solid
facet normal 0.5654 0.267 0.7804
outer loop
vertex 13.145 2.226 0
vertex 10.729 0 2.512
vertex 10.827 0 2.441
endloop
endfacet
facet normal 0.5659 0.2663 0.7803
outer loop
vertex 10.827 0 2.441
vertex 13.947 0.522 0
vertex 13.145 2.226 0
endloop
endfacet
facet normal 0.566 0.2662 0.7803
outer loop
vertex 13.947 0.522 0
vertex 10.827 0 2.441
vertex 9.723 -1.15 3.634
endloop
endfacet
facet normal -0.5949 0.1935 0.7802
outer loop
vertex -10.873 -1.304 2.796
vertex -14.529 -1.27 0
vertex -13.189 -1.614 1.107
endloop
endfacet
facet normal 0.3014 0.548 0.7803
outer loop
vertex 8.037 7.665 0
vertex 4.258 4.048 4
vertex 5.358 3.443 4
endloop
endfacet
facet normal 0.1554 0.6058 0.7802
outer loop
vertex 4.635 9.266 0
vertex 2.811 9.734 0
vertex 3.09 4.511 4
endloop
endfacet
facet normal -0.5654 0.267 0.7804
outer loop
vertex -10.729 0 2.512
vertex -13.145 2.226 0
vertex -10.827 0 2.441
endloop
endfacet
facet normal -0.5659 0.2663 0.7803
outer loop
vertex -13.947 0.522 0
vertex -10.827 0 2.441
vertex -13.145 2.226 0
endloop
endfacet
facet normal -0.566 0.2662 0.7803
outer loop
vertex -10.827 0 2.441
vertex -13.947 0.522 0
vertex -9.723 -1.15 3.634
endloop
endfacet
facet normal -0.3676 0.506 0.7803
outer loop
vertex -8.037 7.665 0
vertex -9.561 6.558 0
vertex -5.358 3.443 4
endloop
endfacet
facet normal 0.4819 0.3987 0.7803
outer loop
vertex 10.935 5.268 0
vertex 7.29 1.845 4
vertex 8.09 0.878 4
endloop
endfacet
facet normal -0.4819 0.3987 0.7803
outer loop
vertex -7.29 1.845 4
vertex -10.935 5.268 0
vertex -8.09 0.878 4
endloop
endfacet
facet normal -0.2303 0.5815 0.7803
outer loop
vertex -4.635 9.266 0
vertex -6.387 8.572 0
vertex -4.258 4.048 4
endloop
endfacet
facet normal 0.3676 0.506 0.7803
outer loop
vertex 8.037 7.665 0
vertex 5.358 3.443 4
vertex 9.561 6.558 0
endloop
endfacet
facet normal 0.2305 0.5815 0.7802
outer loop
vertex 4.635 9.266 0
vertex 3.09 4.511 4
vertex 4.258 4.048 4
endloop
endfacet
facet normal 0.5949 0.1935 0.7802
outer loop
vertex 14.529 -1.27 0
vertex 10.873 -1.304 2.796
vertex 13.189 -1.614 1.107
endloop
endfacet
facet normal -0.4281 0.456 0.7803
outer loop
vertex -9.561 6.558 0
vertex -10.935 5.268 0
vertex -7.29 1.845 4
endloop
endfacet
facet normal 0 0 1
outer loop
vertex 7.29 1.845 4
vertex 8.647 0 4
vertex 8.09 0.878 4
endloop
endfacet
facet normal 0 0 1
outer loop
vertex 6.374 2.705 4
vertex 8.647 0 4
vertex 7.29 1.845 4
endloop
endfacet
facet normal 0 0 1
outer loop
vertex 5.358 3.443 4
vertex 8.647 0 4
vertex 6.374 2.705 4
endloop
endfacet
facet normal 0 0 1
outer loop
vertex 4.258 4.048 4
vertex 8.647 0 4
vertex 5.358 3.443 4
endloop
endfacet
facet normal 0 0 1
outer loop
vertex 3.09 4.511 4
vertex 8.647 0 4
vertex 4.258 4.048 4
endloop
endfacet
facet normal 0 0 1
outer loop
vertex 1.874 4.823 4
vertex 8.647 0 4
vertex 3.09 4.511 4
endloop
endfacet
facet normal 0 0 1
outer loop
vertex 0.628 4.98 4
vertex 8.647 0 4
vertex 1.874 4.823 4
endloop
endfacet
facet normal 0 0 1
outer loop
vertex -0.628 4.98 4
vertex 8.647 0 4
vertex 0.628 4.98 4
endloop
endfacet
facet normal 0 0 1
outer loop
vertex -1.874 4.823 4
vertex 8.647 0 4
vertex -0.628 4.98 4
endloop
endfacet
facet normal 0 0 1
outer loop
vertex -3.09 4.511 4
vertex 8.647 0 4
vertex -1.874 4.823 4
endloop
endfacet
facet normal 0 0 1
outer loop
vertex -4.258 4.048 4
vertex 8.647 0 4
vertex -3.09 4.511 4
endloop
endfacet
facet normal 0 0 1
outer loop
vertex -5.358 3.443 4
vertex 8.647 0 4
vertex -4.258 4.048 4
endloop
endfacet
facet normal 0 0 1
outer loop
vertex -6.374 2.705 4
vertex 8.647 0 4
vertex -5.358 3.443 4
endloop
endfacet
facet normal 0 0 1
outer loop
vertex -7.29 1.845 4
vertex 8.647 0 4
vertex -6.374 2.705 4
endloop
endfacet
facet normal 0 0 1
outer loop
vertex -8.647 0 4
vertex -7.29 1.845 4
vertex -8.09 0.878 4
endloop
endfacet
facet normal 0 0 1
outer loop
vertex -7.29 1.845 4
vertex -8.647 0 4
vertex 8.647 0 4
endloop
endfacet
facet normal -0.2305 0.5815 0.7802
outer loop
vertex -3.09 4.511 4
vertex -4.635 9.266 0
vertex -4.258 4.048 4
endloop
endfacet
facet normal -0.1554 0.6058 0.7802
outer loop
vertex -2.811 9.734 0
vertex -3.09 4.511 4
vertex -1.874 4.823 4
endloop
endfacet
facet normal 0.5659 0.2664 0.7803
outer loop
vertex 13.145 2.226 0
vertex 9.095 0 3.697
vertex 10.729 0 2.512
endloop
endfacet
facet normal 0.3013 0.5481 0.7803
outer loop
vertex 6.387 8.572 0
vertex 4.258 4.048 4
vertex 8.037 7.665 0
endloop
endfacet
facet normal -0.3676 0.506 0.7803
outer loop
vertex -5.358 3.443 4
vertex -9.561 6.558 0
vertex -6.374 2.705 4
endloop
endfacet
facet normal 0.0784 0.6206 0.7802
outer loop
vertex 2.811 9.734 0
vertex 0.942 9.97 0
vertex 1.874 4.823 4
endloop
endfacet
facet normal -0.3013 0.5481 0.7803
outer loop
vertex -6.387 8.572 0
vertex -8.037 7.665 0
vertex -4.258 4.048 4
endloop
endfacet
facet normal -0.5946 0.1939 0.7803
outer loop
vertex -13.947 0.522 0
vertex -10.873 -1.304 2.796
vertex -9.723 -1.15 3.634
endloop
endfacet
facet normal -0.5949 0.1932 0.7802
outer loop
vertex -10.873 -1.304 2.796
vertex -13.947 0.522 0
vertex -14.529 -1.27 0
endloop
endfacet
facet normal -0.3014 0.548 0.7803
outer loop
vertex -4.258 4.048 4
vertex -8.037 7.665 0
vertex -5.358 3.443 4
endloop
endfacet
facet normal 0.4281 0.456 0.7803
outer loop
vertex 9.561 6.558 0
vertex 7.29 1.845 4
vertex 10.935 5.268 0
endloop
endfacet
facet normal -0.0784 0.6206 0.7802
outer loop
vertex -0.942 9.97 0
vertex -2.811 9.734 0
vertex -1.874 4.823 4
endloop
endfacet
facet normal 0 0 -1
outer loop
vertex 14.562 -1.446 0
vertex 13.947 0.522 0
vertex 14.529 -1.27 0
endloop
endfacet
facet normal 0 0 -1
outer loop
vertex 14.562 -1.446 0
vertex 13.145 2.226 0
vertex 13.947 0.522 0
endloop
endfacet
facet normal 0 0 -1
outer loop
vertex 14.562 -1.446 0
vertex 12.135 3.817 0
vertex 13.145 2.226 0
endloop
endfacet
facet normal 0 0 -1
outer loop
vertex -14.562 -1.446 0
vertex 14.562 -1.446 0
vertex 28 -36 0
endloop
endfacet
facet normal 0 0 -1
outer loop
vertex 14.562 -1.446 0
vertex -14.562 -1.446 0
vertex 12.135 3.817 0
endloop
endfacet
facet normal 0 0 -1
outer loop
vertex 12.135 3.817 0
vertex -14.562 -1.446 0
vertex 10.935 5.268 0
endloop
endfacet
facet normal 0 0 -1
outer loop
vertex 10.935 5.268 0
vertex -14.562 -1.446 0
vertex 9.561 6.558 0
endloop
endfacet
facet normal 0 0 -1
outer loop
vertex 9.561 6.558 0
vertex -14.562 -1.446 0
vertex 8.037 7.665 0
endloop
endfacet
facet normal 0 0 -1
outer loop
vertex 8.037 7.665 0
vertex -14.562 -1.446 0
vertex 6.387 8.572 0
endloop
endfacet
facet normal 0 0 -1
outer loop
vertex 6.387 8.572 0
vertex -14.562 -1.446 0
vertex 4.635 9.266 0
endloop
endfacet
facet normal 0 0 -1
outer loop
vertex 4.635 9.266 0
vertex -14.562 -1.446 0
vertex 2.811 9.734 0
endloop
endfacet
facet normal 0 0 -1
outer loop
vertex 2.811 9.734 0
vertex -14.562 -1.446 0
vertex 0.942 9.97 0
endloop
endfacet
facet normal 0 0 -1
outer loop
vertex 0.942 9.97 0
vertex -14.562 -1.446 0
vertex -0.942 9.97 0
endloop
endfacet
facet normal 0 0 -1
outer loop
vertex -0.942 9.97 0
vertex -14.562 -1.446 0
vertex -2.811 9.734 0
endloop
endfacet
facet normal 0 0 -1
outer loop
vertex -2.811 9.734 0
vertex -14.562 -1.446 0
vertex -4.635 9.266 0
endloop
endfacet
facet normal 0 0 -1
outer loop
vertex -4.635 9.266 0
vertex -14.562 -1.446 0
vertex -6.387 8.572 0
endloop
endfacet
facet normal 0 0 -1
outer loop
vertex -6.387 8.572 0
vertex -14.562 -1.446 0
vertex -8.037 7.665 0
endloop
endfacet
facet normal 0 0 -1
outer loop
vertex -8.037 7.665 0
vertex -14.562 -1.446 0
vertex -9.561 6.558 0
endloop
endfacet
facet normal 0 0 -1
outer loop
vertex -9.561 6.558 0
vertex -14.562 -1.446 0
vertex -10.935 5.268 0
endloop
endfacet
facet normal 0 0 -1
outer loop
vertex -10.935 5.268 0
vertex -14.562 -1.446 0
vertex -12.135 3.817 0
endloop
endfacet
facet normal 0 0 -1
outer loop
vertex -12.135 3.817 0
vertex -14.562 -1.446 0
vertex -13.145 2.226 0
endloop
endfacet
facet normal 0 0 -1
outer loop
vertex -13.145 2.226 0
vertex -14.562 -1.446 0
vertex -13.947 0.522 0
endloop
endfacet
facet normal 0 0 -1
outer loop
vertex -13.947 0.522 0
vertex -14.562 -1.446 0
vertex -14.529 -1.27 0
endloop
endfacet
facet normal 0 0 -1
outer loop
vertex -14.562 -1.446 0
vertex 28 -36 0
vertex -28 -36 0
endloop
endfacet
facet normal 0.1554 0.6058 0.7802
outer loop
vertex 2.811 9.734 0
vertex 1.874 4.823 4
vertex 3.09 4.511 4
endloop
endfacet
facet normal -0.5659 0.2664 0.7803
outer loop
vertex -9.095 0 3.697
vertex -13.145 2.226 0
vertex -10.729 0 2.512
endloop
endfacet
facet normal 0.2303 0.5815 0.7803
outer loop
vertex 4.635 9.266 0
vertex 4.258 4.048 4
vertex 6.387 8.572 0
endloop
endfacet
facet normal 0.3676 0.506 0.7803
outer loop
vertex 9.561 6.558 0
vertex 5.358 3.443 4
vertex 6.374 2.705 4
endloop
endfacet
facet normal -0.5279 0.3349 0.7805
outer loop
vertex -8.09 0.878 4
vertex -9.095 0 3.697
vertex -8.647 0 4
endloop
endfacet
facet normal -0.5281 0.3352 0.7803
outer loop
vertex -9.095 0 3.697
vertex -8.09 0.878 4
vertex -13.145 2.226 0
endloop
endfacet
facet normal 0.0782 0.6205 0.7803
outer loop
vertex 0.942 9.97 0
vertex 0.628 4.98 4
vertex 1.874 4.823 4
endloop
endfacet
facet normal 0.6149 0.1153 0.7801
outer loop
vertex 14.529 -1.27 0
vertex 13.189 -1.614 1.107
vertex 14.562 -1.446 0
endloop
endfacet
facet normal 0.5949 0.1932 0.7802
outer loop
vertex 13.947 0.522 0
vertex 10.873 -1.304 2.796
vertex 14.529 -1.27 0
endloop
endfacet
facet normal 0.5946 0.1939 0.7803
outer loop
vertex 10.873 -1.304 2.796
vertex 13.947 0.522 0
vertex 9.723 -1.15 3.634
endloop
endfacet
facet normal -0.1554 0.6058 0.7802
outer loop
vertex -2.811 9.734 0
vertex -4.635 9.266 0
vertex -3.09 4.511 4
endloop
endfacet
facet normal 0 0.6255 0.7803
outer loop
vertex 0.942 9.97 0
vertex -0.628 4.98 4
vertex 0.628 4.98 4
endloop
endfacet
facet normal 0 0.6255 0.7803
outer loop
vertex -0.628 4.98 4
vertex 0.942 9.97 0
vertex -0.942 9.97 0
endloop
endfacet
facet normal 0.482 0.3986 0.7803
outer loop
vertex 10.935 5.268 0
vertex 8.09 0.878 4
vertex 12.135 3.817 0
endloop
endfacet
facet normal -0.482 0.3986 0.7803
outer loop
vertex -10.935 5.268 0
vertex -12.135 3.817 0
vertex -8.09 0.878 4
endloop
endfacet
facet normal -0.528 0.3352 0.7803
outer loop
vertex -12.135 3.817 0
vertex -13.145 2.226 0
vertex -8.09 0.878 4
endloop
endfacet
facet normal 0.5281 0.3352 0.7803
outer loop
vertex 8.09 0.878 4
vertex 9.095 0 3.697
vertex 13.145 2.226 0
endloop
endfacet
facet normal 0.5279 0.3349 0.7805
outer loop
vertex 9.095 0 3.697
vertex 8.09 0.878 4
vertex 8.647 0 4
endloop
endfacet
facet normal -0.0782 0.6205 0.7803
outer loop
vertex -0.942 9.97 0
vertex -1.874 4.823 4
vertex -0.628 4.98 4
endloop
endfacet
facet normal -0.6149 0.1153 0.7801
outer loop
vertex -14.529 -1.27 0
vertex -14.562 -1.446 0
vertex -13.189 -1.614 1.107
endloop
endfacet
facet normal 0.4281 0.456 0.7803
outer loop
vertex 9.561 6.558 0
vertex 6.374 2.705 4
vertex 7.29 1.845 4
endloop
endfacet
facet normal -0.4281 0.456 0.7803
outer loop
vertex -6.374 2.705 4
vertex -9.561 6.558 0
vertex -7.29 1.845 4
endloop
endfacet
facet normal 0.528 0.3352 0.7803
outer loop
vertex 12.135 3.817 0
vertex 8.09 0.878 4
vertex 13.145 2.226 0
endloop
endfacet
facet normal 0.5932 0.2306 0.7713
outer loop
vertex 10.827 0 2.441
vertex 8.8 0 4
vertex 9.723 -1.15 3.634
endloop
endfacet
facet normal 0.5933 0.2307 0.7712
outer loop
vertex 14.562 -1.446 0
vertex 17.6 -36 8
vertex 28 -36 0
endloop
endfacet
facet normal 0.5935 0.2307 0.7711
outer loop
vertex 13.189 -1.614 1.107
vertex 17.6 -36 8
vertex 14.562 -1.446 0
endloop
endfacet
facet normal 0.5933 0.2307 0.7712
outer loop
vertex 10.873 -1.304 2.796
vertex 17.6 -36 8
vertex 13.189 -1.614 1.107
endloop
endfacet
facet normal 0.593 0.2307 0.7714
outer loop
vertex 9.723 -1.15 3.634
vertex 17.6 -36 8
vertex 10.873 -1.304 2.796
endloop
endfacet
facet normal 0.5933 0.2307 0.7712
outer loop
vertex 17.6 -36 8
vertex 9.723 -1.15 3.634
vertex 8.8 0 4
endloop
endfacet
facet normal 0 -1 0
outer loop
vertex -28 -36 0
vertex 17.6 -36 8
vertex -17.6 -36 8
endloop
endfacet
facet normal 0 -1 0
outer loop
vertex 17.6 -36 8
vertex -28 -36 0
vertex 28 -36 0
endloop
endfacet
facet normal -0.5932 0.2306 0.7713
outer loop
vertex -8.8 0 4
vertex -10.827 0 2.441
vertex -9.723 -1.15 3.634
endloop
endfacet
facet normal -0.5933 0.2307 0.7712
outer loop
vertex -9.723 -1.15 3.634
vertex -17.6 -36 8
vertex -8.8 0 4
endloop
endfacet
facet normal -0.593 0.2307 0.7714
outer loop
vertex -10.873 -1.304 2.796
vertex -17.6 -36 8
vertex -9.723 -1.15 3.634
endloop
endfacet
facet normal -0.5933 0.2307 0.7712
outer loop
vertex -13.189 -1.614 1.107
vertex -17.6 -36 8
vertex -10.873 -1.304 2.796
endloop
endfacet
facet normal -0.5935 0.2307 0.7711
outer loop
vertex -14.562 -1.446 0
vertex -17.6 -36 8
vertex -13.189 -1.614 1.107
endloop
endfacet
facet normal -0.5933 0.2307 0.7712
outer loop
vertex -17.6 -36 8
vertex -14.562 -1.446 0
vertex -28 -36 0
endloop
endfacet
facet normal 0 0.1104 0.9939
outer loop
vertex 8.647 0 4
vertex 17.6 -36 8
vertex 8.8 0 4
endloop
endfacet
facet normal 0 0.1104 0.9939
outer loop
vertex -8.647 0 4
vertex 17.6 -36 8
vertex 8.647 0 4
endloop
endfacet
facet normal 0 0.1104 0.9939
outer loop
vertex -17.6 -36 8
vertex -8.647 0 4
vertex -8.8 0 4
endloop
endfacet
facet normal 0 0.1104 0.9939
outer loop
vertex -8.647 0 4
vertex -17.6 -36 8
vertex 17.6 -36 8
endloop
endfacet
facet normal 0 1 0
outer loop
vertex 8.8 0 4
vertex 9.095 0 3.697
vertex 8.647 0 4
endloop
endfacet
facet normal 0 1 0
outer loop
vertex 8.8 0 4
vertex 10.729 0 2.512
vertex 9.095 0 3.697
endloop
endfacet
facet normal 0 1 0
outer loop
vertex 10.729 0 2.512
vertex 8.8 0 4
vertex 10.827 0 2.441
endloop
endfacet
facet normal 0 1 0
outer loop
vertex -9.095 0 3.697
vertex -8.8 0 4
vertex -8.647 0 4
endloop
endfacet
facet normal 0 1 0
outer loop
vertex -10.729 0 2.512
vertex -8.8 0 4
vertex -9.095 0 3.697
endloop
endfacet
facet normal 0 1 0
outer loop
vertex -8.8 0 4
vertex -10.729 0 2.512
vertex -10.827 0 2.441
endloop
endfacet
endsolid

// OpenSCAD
center_hole=20;
tk_base=2;
depth=40;
$fn=50;
union() {
    translate([0,-5,0])
    cylinder(h = tk_base+2, r1 = 3/4*center_hole, r2 = 1/2*center_hole);

    rotate([-90,180,180])
              linear_extrude(height=0.9*depth , scale=2)
                polygon(points=[
                    [0.7 *center_hole, 0],
                    [0.44 *center_hole, tk_base+2],
                    [-0.44*center_hole, tk_base+2],
                    [-0.7*center_hole,0]
                ]);

        }
